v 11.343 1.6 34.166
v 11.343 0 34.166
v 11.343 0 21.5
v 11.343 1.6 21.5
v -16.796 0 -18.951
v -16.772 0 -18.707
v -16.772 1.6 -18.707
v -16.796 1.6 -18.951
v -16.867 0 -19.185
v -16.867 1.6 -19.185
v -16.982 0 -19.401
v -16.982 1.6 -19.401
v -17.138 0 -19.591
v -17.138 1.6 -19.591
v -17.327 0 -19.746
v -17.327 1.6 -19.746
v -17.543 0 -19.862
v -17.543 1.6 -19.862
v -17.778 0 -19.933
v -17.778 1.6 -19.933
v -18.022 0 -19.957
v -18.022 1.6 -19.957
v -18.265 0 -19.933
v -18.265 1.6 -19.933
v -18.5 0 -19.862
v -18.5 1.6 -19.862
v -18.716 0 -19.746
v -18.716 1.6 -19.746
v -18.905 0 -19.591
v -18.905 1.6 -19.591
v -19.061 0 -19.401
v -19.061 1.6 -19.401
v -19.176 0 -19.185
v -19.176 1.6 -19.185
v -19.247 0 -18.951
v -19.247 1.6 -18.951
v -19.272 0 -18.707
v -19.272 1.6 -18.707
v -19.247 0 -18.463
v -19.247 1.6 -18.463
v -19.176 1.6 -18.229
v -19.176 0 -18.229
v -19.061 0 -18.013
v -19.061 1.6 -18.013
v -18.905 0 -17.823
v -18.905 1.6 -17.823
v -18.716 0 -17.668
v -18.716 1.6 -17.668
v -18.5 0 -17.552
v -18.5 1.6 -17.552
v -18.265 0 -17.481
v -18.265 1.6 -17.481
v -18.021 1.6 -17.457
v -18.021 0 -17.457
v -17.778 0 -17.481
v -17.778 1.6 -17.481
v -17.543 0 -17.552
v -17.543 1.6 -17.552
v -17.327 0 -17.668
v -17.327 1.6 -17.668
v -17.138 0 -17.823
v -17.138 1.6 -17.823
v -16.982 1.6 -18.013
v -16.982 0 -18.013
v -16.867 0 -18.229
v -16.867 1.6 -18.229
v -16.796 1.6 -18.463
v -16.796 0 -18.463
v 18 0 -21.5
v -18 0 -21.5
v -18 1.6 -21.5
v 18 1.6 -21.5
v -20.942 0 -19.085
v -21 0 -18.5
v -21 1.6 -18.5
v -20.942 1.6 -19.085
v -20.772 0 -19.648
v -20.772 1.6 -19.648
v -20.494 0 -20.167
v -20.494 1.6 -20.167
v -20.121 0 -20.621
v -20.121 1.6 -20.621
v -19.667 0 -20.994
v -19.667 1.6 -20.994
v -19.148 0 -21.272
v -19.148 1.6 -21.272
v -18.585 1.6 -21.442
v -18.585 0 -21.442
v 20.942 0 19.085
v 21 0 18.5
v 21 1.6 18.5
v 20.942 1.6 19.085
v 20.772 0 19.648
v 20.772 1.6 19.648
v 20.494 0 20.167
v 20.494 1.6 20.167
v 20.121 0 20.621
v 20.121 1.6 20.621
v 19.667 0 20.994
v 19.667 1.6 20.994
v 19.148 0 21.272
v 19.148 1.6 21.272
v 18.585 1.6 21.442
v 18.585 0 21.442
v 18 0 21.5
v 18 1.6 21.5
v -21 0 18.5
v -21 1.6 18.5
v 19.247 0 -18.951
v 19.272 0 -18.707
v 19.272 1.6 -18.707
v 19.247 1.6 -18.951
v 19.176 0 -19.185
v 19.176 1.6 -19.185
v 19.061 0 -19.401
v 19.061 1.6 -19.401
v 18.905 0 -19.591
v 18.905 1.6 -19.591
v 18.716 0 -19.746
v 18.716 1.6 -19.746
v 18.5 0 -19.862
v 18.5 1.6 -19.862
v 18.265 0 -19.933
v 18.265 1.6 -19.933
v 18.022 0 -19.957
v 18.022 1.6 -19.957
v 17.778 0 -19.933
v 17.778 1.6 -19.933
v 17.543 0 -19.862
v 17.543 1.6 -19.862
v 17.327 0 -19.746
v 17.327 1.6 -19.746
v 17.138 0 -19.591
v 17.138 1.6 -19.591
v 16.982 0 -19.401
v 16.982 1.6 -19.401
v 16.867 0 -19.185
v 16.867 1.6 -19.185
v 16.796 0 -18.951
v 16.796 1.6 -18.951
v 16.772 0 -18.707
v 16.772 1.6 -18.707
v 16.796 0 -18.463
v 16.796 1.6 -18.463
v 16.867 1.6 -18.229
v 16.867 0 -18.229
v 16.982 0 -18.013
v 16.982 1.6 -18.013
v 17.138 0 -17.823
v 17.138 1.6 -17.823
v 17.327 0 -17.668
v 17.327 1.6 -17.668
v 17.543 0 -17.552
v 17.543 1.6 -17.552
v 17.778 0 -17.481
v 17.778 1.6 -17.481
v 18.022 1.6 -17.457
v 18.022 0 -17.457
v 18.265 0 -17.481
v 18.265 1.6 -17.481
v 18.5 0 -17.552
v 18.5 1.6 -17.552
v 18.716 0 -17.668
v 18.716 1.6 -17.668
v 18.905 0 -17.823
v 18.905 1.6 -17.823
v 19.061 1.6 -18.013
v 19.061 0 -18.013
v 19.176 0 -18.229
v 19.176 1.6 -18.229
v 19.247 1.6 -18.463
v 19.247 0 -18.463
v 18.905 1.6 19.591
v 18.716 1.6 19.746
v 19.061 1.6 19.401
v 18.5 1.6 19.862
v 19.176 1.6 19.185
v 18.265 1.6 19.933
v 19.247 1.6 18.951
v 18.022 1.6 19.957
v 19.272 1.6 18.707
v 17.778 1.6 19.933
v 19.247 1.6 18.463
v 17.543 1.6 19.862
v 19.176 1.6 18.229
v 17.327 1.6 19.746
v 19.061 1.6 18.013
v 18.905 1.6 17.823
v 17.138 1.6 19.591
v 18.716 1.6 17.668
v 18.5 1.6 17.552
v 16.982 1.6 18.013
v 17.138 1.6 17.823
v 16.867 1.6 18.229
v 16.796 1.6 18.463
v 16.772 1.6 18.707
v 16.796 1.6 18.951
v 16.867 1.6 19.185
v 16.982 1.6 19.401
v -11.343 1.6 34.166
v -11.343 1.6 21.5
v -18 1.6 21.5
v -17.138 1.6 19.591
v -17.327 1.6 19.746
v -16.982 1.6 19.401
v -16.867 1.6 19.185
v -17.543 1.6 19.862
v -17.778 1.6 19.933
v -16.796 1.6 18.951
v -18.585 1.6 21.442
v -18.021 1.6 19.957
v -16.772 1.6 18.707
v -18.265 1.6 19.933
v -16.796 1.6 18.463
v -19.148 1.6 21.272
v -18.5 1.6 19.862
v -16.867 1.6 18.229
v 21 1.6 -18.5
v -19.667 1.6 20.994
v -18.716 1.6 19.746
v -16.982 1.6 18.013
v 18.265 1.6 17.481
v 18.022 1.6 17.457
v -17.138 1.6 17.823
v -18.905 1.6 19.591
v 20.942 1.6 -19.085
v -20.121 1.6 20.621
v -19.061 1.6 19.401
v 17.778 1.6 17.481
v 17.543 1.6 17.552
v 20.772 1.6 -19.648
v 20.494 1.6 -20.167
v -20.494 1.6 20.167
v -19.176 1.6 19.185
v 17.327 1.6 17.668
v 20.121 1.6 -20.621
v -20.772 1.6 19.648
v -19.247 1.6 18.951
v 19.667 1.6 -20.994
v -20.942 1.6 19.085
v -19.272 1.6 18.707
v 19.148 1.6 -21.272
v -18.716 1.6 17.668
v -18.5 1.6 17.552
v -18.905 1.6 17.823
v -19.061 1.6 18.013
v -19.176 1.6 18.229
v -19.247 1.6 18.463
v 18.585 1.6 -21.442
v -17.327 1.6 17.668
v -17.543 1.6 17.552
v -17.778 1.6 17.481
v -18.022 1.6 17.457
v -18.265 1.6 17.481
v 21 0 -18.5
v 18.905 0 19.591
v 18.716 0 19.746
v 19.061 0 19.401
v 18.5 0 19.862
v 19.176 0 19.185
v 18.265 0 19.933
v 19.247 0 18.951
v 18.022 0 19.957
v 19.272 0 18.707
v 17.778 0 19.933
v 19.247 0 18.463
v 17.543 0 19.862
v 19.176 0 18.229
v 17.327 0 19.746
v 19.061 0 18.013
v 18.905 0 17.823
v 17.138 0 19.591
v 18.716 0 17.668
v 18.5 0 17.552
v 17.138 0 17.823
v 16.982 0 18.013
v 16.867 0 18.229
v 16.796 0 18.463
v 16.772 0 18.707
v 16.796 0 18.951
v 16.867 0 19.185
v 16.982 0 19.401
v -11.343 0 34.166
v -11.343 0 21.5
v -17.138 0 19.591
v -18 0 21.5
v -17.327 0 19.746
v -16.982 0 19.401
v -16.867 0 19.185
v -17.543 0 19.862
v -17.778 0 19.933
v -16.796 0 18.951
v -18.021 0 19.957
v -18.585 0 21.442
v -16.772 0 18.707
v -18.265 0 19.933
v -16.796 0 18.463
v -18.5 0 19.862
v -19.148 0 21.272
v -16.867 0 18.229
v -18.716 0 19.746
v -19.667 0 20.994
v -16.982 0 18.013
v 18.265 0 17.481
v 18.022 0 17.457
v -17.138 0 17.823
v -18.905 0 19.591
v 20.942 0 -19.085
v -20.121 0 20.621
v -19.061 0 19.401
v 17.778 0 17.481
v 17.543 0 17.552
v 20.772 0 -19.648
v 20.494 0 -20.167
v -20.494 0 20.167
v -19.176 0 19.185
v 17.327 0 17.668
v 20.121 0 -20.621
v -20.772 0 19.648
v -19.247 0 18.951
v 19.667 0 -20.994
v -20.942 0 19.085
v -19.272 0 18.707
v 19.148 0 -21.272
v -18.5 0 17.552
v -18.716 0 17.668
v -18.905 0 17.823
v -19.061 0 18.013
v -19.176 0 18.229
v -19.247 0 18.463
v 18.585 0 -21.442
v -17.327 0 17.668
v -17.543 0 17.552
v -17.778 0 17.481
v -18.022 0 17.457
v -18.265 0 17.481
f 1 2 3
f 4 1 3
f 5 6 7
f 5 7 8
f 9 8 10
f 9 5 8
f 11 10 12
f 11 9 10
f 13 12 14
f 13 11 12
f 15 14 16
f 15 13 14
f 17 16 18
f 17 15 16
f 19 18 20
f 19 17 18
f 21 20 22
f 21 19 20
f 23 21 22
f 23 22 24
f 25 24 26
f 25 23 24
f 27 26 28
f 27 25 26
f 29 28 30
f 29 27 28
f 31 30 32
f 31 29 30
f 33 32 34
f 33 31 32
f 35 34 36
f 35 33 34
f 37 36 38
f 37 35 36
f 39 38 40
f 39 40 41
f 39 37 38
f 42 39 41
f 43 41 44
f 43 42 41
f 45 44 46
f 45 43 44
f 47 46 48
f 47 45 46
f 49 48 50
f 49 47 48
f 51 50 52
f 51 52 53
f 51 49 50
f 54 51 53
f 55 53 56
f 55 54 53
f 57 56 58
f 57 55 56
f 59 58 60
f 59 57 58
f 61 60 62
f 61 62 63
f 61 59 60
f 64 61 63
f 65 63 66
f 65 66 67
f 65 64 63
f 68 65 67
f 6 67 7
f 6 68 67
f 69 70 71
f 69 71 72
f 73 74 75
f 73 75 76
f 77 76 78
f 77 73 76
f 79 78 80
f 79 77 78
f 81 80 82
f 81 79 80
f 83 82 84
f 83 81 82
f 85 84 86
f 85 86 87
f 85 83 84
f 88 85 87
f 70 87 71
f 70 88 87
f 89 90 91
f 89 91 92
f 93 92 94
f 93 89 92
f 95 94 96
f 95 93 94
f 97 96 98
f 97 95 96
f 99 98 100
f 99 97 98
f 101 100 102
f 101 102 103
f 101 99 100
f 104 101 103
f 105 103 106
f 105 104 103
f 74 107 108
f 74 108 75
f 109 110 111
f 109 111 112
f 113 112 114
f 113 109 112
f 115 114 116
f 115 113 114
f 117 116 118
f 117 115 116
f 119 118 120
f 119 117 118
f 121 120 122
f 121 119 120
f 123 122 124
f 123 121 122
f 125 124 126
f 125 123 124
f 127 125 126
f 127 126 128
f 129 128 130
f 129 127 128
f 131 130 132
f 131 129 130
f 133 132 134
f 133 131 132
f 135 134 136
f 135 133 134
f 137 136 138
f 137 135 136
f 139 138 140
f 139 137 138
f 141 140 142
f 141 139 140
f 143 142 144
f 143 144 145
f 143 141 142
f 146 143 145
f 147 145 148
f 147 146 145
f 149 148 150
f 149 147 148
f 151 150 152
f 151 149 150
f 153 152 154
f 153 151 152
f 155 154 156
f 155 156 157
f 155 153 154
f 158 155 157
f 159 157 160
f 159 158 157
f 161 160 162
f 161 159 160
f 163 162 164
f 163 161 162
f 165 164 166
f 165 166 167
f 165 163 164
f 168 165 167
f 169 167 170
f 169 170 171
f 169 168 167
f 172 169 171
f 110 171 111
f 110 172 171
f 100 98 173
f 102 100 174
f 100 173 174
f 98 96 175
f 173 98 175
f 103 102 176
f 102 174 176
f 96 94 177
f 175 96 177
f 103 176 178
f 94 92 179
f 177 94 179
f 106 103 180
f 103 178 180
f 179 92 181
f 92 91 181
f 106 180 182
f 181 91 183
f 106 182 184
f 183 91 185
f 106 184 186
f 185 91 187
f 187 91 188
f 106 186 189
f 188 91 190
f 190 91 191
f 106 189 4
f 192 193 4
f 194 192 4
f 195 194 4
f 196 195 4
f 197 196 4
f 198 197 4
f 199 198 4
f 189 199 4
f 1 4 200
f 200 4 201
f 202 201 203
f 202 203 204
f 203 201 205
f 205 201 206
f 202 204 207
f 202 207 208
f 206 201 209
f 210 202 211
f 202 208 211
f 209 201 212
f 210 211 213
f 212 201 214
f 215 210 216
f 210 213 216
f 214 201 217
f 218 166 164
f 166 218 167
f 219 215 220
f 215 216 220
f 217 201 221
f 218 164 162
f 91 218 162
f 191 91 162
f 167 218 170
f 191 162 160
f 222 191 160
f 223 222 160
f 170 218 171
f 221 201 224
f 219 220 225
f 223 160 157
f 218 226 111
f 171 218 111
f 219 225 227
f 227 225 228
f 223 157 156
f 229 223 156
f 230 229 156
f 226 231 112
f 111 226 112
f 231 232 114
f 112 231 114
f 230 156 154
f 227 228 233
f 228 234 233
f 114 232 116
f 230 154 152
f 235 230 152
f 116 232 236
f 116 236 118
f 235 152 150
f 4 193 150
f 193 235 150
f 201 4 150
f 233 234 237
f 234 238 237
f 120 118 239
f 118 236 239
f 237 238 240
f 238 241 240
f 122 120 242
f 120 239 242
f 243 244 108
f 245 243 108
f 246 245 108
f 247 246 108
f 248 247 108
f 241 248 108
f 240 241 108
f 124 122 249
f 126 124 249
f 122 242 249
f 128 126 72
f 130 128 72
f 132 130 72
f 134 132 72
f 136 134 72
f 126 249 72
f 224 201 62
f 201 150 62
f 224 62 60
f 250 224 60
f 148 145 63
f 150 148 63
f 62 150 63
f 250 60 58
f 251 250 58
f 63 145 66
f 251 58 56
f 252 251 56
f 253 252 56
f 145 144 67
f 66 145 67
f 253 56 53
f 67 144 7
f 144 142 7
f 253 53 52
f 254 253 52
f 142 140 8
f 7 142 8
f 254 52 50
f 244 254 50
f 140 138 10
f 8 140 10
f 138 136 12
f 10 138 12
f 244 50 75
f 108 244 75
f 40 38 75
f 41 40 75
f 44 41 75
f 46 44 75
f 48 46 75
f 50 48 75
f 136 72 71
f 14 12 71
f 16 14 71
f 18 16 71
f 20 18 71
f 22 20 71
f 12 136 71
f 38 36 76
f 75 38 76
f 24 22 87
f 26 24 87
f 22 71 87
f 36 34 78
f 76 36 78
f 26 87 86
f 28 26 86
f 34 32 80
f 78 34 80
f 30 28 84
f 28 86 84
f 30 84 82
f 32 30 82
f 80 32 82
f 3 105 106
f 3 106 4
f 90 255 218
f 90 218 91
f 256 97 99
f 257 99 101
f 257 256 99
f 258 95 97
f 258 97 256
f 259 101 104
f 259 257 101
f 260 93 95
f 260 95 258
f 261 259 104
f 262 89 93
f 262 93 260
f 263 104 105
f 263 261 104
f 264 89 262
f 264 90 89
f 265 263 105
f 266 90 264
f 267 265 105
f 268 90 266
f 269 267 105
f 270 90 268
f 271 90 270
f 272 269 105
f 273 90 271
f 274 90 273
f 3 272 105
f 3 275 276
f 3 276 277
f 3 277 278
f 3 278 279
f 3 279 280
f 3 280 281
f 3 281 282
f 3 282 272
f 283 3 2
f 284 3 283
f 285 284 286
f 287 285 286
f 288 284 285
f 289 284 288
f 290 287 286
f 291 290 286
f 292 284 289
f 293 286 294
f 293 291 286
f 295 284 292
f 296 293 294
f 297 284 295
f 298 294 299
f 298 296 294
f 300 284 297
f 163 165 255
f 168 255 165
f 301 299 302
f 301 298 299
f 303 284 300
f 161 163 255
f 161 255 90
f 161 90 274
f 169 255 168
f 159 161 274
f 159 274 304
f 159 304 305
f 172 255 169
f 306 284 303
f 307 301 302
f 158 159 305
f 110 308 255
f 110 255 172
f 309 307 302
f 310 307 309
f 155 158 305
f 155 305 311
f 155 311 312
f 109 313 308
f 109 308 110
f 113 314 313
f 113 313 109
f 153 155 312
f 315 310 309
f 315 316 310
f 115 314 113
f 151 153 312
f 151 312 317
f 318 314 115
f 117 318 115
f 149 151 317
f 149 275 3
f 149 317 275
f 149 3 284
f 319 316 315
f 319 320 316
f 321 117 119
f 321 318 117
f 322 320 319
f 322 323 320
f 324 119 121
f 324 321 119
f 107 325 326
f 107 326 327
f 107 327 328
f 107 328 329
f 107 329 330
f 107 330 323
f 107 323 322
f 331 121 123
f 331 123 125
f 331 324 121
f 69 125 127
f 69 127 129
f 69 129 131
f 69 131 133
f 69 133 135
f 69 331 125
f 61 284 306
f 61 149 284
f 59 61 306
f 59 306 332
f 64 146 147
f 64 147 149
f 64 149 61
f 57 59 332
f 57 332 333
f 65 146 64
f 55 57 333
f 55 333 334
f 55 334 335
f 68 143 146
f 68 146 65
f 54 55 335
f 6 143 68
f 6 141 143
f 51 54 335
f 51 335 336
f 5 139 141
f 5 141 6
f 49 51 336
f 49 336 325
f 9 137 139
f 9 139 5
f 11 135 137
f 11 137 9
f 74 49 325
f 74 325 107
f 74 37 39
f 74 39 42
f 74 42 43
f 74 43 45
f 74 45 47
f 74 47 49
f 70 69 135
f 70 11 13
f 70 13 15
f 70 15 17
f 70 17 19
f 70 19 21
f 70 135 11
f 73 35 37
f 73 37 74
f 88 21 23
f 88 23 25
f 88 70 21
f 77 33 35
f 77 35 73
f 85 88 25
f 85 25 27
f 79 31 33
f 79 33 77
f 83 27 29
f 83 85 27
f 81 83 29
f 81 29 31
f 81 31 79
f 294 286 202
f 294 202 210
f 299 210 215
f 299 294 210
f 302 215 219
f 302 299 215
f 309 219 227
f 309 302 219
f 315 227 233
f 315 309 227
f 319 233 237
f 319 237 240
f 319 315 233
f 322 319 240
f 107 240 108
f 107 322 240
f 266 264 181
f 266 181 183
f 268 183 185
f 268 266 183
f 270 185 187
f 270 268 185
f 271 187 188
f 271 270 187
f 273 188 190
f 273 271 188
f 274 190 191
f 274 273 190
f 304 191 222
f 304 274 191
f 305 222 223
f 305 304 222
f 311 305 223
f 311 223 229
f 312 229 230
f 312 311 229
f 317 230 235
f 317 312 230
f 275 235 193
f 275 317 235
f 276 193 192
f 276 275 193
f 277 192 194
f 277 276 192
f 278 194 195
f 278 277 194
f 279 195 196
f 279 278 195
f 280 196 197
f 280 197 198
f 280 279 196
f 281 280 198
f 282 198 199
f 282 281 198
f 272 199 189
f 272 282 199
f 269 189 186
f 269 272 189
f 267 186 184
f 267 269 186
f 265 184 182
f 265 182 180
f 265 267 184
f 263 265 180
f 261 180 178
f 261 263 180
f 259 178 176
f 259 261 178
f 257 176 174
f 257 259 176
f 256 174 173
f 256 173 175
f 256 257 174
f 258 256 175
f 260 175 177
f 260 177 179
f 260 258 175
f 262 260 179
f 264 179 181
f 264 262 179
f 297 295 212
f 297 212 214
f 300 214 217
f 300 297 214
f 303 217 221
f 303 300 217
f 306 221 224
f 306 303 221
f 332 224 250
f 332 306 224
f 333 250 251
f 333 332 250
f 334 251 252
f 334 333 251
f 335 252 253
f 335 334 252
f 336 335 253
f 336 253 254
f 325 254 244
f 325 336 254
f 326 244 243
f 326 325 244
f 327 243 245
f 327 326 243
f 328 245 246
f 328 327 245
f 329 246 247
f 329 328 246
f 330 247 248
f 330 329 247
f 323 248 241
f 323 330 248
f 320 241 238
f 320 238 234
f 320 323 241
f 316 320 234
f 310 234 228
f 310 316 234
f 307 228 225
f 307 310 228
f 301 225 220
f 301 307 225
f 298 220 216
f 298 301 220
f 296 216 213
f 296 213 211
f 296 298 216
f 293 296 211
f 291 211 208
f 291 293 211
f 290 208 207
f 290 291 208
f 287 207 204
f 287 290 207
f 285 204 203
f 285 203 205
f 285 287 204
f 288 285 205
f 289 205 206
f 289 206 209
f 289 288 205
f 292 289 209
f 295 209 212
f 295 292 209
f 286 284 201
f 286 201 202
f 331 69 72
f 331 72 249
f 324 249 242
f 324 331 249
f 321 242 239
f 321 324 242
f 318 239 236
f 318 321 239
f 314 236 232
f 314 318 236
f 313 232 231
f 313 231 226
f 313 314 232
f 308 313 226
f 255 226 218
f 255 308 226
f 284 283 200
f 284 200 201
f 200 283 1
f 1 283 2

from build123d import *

# Parameters (mm, degrees)
SKETCH1_R           = 1.25
BOSS_EXTRUDE1_DEPTH = 1.6


with BuildPart() as part:
    # Sketch1 → Boss-Extrude1 (new body)
    with BuildSketch(Plane(origin=(0, 0, 0), x_dir=(1, 0, 0), z_dir=(0, 1, 0))):
        with BuildLine():
            Line((18, 21.5), (-18, 21.5))
            ThreePointArc((-18, 21.5), (-20.121320344, 20.621320344), (-21, 18.5))
            Line((-21, 18.5), (-21, -18.5))
            ThreePointArc((-21, -18.5), (-20.121320344, -20.621320344), (-18, -21.5))
            Line((-18, -21.5), (-11.343422478, -21.5))
            Line((-11.343422478, -21.5), (-11.343422478, -34.166164059))
            Line((-11.343422478, -34.166164059), (11.343422478, -34.166164059))
            Line((11.343422478, -34.166164059), (11.343422478, -21.5))
            Line((11.343422478, -21.5), (18, -21.5))
            ThreePointArc((18, -21.5), (20.121320344, -20.621320344), (21, -18.5))
            Line((21, -18.5), (21, 18.5))
            ThreePointArc((21, 18.5), (20.121320344, 20.621320344), (18, 21.5))
        make_face()
        with Locations((-18.0215, -18.707)):
            Circle(SKETCH1_R, mode=Mode.SUBTRACT)
        with Locations((18.0215, -18.707)):
            Circle(SKETCH1_R, mode=Mode.SUBTRACT)
        with Locations((-18.0215, 18.707)):
            Circle(SKETCH1_R, mode=Mode.SUBTRACT)
        with Locations((18.0215, 18.707)):
            Circle(SKETCH1_R, mode=Mode.SUBTRACT)
    extrude(amount=BOSS_EXTRUDE1_DEPTH)


solid = part.part
